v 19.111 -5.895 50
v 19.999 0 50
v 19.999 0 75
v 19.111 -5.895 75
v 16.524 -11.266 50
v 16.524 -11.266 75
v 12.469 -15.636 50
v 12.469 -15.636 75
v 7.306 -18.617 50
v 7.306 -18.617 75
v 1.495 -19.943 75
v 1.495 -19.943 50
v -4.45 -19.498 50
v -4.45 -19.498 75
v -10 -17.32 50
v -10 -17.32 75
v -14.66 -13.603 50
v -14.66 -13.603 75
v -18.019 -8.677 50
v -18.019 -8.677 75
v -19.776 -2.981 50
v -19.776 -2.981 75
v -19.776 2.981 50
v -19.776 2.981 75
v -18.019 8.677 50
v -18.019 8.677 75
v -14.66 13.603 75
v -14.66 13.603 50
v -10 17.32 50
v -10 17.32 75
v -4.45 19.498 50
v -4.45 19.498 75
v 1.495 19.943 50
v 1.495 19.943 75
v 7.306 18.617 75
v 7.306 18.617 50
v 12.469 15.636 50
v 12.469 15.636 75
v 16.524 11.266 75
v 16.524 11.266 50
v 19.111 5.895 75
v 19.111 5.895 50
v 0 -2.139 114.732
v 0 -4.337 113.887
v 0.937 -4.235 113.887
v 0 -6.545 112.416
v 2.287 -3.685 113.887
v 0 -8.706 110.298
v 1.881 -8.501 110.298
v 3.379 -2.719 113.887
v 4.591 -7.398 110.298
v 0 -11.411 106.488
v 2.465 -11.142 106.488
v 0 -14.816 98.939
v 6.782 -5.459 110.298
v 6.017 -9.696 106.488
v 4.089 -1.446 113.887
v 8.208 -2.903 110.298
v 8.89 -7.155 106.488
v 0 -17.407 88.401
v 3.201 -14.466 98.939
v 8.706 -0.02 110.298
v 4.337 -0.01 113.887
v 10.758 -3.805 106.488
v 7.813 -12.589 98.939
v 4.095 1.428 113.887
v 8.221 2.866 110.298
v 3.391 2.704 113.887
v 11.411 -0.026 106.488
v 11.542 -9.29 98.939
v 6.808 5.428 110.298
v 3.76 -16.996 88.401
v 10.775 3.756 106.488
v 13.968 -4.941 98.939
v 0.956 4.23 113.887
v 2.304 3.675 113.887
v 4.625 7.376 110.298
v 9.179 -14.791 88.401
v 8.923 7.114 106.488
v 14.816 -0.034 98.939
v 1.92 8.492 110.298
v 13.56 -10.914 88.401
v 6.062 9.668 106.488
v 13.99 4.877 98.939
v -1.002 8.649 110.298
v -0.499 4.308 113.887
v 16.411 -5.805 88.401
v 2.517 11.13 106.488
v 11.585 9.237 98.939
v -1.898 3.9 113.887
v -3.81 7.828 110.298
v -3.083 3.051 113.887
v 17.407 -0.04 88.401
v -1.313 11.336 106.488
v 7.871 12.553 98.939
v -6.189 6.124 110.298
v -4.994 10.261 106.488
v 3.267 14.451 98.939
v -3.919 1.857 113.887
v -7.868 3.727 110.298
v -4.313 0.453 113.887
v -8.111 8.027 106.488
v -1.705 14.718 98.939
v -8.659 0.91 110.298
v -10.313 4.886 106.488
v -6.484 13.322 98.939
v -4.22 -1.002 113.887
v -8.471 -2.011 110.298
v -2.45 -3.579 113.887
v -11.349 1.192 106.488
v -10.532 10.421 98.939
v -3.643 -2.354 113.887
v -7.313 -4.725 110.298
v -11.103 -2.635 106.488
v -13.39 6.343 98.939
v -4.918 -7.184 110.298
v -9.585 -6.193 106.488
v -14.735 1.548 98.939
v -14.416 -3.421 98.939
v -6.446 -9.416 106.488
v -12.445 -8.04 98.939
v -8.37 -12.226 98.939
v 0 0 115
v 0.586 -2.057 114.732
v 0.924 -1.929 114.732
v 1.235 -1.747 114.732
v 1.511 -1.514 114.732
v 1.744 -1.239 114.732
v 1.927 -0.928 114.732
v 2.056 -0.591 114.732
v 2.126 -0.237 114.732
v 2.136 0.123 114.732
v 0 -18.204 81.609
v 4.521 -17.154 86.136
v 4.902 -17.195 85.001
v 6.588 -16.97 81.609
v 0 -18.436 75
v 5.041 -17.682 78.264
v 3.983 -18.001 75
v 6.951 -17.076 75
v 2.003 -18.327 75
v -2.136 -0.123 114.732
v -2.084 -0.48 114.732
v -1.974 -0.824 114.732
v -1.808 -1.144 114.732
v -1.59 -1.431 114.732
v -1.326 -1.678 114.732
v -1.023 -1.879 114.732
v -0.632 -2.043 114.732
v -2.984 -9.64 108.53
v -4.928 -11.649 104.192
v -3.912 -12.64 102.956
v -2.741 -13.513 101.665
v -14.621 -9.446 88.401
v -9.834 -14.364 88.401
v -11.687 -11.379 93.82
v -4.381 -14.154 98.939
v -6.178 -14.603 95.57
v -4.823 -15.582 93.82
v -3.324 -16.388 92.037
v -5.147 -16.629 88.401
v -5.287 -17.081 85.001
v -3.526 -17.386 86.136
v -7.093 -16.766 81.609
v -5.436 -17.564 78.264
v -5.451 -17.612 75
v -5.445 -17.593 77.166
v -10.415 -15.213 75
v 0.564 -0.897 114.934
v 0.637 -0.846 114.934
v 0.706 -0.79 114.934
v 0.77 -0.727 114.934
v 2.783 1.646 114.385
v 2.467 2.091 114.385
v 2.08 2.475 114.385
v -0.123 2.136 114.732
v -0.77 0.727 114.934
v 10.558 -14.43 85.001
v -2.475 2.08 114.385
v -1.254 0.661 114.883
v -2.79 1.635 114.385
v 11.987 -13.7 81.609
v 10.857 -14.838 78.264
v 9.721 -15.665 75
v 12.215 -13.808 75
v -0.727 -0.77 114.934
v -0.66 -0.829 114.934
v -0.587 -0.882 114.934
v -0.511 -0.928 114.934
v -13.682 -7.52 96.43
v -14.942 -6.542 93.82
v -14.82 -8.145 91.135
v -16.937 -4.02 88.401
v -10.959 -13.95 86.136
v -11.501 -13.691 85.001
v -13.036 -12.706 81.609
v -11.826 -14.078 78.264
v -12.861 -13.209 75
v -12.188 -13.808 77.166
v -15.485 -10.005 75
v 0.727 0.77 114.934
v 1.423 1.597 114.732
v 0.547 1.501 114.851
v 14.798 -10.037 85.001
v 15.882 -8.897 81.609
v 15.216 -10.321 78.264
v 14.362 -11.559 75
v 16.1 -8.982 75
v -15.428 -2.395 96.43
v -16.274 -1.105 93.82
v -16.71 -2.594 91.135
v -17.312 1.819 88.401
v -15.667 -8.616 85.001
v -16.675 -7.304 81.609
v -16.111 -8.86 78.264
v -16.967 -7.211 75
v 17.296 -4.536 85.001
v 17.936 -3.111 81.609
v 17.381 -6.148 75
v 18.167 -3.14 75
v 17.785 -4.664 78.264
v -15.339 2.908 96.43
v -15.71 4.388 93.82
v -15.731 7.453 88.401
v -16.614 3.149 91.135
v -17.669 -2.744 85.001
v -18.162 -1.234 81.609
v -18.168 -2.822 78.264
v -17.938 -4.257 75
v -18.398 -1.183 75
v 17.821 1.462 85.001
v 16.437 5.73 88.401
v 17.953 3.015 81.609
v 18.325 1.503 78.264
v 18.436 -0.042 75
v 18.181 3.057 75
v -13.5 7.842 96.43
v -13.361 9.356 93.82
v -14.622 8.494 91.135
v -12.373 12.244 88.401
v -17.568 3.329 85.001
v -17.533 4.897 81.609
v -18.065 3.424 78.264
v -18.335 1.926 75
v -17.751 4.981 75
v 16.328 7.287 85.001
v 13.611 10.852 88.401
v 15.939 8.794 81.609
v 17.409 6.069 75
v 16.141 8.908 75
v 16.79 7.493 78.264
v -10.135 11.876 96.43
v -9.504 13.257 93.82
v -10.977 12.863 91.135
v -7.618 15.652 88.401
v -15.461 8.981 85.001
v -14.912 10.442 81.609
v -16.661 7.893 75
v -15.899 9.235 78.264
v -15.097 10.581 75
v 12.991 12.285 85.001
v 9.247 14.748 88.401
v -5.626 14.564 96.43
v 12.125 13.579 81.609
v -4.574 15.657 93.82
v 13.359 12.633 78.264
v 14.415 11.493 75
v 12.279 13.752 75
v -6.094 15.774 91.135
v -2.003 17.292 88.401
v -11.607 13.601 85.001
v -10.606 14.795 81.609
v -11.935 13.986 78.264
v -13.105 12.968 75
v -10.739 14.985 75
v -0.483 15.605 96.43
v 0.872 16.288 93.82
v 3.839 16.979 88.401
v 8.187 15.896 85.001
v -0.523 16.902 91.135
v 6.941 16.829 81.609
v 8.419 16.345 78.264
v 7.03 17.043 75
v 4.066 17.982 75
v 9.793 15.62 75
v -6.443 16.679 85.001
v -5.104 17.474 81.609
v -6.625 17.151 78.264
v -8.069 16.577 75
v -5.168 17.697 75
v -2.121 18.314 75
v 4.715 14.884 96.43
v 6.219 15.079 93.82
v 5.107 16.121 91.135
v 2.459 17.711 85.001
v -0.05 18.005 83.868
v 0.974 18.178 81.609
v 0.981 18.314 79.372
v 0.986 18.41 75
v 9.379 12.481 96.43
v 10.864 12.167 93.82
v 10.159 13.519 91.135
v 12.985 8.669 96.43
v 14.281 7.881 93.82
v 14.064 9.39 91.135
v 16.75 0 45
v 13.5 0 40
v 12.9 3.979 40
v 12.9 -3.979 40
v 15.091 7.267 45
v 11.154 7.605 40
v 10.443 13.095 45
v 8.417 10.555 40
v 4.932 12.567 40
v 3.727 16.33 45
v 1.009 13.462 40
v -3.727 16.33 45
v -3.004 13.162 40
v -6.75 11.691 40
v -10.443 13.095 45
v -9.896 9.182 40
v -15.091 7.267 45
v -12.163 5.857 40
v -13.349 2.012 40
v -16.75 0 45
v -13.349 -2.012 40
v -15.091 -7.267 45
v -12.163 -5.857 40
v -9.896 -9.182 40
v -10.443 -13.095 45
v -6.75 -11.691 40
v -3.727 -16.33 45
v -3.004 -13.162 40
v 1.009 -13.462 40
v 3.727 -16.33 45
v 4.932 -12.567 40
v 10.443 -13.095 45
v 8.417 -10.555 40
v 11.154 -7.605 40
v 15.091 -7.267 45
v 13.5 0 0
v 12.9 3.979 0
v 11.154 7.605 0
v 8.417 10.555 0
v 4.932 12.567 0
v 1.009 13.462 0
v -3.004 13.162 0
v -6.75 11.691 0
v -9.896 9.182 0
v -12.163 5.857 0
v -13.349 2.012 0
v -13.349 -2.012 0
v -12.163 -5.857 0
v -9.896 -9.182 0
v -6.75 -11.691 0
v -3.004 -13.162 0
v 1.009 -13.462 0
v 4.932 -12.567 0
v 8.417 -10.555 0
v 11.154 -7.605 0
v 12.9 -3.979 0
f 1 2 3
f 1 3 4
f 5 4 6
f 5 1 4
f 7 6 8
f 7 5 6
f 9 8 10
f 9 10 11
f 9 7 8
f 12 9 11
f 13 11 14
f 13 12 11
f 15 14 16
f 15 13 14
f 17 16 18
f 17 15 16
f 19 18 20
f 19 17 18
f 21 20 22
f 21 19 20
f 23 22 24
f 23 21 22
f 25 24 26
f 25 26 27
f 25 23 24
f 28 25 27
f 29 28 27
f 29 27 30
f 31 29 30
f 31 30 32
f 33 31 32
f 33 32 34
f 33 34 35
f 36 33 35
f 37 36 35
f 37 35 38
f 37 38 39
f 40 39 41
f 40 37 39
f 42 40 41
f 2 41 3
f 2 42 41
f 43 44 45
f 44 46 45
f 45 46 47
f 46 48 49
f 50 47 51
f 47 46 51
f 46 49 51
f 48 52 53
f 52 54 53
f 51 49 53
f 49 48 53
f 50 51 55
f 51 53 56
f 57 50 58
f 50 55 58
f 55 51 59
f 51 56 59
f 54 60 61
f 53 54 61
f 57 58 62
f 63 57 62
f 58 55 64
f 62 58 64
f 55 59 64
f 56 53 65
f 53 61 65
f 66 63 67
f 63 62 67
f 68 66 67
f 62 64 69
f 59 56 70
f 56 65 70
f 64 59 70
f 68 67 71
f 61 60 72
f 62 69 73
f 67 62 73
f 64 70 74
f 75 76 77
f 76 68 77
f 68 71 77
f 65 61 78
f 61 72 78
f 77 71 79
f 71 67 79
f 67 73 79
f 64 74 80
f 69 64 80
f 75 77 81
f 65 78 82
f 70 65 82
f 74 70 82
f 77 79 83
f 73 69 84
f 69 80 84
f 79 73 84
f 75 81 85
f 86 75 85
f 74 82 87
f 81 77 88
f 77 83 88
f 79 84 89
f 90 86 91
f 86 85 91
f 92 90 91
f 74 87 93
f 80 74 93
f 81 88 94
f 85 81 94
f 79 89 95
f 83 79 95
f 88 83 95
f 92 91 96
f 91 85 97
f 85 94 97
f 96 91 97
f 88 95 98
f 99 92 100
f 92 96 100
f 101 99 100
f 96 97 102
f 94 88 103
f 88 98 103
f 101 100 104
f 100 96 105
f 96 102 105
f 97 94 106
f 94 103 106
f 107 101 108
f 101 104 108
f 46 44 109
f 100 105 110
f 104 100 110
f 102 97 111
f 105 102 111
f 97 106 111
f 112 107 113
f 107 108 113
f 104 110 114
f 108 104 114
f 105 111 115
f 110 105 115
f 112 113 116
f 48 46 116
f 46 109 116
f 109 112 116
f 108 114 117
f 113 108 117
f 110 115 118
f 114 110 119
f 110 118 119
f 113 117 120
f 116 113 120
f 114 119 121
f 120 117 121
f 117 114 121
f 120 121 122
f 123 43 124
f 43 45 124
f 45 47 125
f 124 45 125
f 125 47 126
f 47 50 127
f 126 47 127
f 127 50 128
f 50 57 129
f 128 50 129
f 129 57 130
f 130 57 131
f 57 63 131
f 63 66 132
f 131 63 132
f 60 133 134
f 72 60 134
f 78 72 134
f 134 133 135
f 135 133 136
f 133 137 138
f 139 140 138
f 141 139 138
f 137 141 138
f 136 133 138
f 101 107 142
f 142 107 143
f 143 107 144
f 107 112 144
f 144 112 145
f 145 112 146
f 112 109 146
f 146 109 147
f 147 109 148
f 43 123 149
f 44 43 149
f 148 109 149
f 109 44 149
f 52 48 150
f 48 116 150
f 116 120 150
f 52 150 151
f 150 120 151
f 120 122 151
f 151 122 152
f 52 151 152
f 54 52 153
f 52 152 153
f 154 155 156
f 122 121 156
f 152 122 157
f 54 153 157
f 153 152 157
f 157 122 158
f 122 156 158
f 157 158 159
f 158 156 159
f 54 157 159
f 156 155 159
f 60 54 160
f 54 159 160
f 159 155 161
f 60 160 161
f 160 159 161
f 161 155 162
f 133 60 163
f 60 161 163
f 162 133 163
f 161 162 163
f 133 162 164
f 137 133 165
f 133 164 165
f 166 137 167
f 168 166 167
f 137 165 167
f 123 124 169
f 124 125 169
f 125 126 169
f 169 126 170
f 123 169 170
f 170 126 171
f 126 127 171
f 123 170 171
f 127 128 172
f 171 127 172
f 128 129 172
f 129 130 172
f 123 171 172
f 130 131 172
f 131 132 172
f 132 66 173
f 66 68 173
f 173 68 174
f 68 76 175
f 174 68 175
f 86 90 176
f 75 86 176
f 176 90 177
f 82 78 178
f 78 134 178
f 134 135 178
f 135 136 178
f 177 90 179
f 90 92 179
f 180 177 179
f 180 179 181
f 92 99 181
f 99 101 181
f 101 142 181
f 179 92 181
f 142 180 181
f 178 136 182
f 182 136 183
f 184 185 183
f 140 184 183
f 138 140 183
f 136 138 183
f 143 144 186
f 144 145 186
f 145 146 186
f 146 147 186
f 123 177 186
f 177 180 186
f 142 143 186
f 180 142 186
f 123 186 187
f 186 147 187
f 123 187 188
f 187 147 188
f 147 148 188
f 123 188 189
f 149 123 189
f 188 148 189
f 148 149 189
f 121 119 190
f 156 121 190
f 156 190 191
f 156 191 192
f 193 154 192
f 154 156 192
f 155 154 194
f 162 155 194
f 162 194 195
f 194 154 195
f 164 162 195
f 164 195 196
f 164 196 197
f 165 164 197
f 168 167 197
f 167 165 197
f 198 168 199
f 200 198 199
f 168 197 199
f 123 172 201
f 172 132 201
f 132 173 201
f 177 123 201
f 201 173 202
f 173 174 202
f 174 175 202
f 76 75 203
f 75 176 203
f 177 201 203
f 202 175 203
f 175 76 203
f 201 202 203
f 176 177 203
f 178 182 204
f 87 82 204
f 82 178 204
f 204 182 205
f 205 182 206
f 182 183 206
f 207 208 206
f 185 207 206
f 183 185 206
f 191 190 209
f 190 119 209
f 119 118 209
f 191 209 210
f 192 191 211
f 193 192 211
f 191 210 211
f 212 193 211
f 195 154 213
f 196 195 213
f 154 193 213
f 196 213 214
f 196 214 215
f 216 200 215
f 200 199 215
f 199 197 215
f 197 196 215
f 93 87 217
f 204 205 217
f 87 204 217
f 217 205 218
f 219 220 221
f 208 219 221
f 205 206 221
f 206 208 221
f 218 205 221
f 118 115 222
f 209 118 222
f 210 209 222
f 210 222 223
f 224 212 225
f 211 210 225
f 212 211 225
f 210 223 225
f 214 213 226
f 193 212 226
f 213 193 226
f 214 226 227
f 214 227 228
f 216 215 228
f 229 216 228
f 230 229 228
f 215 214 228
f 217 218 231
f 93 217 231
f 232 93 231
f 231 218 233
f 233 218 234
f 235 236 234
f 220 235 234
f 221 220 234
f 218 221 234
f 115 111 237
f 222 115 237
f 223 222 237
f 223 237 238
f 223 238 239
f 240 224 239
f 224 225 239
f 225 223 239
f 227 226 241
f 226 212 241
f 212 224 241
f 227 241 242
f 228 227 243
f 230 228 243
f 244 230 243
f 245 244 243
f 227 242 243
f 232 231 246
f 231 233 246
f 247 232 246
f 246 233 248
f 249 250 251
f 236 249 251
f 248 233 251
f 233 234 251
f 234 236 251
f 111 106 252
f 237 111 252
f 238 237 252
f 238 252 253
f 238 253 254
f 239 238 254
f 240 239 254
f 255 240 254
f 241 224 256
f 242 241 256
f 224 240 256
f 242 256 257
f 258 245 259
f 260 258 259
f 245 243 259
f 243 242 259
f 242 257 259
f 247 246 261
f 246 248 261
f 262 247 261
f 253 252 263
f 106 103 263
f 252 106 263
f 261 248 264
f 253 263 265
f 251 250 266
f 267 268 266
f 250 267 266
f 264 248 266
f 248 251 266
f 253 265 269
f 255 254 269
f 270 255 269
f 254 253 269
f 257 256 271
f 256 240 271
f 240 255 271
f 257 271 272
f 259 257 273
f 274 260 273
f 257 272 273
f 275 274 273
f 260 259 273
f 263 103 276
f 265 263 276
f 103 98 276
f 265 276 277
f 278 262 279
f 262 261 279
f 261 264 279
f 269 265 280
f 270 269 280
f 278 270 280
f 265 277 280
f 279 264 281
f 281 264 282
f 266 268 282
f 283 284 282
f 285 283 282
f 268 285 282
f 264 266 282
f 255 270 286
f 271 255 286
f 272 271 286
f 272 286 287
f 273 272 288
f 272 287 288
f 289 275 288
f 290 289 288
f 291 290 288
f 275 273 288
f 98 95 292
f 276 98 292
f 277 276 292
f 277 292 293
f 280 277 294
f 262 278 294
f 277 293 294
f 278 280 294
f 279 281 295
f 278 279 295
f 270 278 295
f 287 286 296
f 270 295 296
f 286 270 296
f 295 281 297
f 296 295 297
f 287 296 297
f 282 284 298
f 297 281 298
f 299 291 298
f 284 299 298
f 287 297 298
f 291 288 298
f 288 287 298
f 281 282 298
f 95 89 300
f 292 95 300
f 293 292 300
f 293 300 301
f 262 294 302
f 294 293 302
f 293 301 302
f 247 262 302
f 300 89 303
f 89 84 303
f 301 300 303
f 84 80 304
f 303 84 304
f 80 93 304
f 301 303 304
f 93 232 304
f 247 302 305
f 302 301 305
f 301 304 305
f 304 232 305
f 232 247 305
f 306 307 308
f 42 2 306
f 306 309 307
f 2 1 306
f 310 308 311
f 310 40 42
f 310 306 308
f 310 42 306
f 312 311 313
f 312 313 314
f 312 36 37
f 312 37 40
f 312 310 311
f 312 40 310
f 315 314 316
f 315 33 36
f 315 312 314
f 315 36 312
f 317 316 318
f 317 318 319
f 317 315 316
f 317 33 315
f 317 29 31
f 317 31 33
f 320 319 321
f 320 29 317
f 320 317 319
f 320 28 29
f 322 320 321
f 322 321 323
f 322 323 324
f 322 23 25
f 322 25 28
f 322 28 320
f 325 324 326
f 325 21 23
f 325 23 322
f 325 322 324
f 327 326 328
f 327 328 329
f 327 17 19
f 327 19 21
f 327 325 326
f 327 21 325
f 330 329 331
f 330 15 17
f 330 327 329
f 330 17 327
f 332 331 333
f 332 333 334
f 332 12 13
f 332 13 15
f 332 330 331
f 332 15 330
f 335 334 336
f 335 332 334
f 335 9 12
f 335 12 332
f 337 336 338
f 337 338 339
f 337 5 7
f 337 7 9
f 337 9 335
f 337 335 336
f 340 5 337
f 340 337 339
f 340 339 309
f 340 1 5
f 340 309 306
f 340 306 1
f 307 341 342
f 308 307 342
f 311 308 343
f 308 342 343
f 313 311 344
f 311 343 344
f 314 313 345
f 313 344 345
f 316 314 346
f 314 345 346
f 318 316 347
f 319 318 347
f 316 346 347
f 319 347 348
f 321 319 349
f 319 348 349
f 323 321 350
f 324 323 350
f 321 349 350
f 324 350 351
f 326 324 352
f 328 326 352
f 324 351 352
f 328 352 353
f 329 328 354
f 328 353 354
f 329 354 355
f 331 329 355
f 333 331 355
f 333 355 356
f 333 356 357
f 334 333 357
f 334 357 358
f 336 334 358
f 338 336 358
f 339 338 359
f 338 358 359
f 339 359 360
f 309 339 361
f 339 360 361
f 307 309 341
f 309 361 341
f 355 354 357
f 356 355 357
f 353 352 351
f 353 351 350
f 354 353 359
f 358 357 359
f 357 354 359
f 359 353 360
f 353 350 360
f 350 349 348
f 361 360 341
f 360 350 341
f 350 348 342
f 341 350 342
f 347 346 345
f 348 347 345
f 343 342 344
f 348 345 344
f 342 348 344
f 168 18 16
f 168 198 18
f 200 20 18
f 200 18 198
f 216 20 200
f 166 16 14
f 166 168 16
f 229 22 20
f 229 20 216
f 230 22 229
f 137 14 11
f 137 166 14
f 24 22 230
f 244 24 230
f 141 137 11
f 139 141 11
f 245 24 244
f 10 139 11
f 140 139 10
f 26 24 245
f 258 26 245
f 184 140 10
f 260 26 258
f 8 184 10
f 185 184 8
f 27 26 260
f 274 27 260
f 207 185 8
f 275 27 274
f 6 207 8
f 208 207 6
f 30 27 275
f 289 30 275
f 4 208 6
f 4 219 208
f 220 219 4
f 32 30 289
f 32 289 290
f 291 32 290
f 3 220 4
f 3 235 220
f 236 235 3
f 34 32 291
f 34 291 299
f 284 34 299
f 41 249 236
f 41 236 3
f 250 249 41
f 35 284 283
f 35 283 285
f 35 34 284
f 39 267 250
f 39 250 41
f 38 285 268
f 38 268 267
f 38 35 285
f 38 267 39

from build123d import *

# Parameters (mm, degrees)
F0_R      = 13.5
F1_DEPTH  = 40
F1_FACE_R = 13.5
F2_DEPTH  = 10
F2_TAPER  = -33.02
F3_DEPTH  = 25


with BuildPart() as f1:
    # F0 (on Top) → F1 (new body)
    with BuildSketch(Plane.XY):
        Circle(F0_R)
    extrude(amount=F1_DEPTH)

    # F1_face (on face) → F2 (join)
    with BuildSketch(Plane.XY.offset(40)):
        Circle(F1_FACE_R)
    extrude(amount=F2_DEPTH, taper=F2_TAPER)

    # F3 (add): a face of the model
    f3_faces = [f1.faces().sort_by_distance(p)[0] for p in [
        (0, 0, 50),
    ]]
    extrude(f3_faces, amount=F3_DEPTH)

    # F4 (on Right) → F5 (revolve)
    with BuildSketch(Plane.YZ):
        with BuildLine():
            add(Edge.make_bspline(
                [(0, 115), (-18.4366899531, 115), (-18.4366899531, 75.3298997879), (-18.4366899531, 35.6597995758), (0, 35.6597995758)],
                knots=[0, 0, 0, 1.5707963268, 1.5707963268, 3.1415926536, 3.1415926536, 3.1415926536], degree=2, weights=[1, 0.7071067812, 1, 0.7071067812, 1]))
            Line((0, 35.6597995758), (0, 115))
        make_face()
    revolve(axis=Axis((0, 0, 57.5), (0, 0, 1)))


solid = f1.part
